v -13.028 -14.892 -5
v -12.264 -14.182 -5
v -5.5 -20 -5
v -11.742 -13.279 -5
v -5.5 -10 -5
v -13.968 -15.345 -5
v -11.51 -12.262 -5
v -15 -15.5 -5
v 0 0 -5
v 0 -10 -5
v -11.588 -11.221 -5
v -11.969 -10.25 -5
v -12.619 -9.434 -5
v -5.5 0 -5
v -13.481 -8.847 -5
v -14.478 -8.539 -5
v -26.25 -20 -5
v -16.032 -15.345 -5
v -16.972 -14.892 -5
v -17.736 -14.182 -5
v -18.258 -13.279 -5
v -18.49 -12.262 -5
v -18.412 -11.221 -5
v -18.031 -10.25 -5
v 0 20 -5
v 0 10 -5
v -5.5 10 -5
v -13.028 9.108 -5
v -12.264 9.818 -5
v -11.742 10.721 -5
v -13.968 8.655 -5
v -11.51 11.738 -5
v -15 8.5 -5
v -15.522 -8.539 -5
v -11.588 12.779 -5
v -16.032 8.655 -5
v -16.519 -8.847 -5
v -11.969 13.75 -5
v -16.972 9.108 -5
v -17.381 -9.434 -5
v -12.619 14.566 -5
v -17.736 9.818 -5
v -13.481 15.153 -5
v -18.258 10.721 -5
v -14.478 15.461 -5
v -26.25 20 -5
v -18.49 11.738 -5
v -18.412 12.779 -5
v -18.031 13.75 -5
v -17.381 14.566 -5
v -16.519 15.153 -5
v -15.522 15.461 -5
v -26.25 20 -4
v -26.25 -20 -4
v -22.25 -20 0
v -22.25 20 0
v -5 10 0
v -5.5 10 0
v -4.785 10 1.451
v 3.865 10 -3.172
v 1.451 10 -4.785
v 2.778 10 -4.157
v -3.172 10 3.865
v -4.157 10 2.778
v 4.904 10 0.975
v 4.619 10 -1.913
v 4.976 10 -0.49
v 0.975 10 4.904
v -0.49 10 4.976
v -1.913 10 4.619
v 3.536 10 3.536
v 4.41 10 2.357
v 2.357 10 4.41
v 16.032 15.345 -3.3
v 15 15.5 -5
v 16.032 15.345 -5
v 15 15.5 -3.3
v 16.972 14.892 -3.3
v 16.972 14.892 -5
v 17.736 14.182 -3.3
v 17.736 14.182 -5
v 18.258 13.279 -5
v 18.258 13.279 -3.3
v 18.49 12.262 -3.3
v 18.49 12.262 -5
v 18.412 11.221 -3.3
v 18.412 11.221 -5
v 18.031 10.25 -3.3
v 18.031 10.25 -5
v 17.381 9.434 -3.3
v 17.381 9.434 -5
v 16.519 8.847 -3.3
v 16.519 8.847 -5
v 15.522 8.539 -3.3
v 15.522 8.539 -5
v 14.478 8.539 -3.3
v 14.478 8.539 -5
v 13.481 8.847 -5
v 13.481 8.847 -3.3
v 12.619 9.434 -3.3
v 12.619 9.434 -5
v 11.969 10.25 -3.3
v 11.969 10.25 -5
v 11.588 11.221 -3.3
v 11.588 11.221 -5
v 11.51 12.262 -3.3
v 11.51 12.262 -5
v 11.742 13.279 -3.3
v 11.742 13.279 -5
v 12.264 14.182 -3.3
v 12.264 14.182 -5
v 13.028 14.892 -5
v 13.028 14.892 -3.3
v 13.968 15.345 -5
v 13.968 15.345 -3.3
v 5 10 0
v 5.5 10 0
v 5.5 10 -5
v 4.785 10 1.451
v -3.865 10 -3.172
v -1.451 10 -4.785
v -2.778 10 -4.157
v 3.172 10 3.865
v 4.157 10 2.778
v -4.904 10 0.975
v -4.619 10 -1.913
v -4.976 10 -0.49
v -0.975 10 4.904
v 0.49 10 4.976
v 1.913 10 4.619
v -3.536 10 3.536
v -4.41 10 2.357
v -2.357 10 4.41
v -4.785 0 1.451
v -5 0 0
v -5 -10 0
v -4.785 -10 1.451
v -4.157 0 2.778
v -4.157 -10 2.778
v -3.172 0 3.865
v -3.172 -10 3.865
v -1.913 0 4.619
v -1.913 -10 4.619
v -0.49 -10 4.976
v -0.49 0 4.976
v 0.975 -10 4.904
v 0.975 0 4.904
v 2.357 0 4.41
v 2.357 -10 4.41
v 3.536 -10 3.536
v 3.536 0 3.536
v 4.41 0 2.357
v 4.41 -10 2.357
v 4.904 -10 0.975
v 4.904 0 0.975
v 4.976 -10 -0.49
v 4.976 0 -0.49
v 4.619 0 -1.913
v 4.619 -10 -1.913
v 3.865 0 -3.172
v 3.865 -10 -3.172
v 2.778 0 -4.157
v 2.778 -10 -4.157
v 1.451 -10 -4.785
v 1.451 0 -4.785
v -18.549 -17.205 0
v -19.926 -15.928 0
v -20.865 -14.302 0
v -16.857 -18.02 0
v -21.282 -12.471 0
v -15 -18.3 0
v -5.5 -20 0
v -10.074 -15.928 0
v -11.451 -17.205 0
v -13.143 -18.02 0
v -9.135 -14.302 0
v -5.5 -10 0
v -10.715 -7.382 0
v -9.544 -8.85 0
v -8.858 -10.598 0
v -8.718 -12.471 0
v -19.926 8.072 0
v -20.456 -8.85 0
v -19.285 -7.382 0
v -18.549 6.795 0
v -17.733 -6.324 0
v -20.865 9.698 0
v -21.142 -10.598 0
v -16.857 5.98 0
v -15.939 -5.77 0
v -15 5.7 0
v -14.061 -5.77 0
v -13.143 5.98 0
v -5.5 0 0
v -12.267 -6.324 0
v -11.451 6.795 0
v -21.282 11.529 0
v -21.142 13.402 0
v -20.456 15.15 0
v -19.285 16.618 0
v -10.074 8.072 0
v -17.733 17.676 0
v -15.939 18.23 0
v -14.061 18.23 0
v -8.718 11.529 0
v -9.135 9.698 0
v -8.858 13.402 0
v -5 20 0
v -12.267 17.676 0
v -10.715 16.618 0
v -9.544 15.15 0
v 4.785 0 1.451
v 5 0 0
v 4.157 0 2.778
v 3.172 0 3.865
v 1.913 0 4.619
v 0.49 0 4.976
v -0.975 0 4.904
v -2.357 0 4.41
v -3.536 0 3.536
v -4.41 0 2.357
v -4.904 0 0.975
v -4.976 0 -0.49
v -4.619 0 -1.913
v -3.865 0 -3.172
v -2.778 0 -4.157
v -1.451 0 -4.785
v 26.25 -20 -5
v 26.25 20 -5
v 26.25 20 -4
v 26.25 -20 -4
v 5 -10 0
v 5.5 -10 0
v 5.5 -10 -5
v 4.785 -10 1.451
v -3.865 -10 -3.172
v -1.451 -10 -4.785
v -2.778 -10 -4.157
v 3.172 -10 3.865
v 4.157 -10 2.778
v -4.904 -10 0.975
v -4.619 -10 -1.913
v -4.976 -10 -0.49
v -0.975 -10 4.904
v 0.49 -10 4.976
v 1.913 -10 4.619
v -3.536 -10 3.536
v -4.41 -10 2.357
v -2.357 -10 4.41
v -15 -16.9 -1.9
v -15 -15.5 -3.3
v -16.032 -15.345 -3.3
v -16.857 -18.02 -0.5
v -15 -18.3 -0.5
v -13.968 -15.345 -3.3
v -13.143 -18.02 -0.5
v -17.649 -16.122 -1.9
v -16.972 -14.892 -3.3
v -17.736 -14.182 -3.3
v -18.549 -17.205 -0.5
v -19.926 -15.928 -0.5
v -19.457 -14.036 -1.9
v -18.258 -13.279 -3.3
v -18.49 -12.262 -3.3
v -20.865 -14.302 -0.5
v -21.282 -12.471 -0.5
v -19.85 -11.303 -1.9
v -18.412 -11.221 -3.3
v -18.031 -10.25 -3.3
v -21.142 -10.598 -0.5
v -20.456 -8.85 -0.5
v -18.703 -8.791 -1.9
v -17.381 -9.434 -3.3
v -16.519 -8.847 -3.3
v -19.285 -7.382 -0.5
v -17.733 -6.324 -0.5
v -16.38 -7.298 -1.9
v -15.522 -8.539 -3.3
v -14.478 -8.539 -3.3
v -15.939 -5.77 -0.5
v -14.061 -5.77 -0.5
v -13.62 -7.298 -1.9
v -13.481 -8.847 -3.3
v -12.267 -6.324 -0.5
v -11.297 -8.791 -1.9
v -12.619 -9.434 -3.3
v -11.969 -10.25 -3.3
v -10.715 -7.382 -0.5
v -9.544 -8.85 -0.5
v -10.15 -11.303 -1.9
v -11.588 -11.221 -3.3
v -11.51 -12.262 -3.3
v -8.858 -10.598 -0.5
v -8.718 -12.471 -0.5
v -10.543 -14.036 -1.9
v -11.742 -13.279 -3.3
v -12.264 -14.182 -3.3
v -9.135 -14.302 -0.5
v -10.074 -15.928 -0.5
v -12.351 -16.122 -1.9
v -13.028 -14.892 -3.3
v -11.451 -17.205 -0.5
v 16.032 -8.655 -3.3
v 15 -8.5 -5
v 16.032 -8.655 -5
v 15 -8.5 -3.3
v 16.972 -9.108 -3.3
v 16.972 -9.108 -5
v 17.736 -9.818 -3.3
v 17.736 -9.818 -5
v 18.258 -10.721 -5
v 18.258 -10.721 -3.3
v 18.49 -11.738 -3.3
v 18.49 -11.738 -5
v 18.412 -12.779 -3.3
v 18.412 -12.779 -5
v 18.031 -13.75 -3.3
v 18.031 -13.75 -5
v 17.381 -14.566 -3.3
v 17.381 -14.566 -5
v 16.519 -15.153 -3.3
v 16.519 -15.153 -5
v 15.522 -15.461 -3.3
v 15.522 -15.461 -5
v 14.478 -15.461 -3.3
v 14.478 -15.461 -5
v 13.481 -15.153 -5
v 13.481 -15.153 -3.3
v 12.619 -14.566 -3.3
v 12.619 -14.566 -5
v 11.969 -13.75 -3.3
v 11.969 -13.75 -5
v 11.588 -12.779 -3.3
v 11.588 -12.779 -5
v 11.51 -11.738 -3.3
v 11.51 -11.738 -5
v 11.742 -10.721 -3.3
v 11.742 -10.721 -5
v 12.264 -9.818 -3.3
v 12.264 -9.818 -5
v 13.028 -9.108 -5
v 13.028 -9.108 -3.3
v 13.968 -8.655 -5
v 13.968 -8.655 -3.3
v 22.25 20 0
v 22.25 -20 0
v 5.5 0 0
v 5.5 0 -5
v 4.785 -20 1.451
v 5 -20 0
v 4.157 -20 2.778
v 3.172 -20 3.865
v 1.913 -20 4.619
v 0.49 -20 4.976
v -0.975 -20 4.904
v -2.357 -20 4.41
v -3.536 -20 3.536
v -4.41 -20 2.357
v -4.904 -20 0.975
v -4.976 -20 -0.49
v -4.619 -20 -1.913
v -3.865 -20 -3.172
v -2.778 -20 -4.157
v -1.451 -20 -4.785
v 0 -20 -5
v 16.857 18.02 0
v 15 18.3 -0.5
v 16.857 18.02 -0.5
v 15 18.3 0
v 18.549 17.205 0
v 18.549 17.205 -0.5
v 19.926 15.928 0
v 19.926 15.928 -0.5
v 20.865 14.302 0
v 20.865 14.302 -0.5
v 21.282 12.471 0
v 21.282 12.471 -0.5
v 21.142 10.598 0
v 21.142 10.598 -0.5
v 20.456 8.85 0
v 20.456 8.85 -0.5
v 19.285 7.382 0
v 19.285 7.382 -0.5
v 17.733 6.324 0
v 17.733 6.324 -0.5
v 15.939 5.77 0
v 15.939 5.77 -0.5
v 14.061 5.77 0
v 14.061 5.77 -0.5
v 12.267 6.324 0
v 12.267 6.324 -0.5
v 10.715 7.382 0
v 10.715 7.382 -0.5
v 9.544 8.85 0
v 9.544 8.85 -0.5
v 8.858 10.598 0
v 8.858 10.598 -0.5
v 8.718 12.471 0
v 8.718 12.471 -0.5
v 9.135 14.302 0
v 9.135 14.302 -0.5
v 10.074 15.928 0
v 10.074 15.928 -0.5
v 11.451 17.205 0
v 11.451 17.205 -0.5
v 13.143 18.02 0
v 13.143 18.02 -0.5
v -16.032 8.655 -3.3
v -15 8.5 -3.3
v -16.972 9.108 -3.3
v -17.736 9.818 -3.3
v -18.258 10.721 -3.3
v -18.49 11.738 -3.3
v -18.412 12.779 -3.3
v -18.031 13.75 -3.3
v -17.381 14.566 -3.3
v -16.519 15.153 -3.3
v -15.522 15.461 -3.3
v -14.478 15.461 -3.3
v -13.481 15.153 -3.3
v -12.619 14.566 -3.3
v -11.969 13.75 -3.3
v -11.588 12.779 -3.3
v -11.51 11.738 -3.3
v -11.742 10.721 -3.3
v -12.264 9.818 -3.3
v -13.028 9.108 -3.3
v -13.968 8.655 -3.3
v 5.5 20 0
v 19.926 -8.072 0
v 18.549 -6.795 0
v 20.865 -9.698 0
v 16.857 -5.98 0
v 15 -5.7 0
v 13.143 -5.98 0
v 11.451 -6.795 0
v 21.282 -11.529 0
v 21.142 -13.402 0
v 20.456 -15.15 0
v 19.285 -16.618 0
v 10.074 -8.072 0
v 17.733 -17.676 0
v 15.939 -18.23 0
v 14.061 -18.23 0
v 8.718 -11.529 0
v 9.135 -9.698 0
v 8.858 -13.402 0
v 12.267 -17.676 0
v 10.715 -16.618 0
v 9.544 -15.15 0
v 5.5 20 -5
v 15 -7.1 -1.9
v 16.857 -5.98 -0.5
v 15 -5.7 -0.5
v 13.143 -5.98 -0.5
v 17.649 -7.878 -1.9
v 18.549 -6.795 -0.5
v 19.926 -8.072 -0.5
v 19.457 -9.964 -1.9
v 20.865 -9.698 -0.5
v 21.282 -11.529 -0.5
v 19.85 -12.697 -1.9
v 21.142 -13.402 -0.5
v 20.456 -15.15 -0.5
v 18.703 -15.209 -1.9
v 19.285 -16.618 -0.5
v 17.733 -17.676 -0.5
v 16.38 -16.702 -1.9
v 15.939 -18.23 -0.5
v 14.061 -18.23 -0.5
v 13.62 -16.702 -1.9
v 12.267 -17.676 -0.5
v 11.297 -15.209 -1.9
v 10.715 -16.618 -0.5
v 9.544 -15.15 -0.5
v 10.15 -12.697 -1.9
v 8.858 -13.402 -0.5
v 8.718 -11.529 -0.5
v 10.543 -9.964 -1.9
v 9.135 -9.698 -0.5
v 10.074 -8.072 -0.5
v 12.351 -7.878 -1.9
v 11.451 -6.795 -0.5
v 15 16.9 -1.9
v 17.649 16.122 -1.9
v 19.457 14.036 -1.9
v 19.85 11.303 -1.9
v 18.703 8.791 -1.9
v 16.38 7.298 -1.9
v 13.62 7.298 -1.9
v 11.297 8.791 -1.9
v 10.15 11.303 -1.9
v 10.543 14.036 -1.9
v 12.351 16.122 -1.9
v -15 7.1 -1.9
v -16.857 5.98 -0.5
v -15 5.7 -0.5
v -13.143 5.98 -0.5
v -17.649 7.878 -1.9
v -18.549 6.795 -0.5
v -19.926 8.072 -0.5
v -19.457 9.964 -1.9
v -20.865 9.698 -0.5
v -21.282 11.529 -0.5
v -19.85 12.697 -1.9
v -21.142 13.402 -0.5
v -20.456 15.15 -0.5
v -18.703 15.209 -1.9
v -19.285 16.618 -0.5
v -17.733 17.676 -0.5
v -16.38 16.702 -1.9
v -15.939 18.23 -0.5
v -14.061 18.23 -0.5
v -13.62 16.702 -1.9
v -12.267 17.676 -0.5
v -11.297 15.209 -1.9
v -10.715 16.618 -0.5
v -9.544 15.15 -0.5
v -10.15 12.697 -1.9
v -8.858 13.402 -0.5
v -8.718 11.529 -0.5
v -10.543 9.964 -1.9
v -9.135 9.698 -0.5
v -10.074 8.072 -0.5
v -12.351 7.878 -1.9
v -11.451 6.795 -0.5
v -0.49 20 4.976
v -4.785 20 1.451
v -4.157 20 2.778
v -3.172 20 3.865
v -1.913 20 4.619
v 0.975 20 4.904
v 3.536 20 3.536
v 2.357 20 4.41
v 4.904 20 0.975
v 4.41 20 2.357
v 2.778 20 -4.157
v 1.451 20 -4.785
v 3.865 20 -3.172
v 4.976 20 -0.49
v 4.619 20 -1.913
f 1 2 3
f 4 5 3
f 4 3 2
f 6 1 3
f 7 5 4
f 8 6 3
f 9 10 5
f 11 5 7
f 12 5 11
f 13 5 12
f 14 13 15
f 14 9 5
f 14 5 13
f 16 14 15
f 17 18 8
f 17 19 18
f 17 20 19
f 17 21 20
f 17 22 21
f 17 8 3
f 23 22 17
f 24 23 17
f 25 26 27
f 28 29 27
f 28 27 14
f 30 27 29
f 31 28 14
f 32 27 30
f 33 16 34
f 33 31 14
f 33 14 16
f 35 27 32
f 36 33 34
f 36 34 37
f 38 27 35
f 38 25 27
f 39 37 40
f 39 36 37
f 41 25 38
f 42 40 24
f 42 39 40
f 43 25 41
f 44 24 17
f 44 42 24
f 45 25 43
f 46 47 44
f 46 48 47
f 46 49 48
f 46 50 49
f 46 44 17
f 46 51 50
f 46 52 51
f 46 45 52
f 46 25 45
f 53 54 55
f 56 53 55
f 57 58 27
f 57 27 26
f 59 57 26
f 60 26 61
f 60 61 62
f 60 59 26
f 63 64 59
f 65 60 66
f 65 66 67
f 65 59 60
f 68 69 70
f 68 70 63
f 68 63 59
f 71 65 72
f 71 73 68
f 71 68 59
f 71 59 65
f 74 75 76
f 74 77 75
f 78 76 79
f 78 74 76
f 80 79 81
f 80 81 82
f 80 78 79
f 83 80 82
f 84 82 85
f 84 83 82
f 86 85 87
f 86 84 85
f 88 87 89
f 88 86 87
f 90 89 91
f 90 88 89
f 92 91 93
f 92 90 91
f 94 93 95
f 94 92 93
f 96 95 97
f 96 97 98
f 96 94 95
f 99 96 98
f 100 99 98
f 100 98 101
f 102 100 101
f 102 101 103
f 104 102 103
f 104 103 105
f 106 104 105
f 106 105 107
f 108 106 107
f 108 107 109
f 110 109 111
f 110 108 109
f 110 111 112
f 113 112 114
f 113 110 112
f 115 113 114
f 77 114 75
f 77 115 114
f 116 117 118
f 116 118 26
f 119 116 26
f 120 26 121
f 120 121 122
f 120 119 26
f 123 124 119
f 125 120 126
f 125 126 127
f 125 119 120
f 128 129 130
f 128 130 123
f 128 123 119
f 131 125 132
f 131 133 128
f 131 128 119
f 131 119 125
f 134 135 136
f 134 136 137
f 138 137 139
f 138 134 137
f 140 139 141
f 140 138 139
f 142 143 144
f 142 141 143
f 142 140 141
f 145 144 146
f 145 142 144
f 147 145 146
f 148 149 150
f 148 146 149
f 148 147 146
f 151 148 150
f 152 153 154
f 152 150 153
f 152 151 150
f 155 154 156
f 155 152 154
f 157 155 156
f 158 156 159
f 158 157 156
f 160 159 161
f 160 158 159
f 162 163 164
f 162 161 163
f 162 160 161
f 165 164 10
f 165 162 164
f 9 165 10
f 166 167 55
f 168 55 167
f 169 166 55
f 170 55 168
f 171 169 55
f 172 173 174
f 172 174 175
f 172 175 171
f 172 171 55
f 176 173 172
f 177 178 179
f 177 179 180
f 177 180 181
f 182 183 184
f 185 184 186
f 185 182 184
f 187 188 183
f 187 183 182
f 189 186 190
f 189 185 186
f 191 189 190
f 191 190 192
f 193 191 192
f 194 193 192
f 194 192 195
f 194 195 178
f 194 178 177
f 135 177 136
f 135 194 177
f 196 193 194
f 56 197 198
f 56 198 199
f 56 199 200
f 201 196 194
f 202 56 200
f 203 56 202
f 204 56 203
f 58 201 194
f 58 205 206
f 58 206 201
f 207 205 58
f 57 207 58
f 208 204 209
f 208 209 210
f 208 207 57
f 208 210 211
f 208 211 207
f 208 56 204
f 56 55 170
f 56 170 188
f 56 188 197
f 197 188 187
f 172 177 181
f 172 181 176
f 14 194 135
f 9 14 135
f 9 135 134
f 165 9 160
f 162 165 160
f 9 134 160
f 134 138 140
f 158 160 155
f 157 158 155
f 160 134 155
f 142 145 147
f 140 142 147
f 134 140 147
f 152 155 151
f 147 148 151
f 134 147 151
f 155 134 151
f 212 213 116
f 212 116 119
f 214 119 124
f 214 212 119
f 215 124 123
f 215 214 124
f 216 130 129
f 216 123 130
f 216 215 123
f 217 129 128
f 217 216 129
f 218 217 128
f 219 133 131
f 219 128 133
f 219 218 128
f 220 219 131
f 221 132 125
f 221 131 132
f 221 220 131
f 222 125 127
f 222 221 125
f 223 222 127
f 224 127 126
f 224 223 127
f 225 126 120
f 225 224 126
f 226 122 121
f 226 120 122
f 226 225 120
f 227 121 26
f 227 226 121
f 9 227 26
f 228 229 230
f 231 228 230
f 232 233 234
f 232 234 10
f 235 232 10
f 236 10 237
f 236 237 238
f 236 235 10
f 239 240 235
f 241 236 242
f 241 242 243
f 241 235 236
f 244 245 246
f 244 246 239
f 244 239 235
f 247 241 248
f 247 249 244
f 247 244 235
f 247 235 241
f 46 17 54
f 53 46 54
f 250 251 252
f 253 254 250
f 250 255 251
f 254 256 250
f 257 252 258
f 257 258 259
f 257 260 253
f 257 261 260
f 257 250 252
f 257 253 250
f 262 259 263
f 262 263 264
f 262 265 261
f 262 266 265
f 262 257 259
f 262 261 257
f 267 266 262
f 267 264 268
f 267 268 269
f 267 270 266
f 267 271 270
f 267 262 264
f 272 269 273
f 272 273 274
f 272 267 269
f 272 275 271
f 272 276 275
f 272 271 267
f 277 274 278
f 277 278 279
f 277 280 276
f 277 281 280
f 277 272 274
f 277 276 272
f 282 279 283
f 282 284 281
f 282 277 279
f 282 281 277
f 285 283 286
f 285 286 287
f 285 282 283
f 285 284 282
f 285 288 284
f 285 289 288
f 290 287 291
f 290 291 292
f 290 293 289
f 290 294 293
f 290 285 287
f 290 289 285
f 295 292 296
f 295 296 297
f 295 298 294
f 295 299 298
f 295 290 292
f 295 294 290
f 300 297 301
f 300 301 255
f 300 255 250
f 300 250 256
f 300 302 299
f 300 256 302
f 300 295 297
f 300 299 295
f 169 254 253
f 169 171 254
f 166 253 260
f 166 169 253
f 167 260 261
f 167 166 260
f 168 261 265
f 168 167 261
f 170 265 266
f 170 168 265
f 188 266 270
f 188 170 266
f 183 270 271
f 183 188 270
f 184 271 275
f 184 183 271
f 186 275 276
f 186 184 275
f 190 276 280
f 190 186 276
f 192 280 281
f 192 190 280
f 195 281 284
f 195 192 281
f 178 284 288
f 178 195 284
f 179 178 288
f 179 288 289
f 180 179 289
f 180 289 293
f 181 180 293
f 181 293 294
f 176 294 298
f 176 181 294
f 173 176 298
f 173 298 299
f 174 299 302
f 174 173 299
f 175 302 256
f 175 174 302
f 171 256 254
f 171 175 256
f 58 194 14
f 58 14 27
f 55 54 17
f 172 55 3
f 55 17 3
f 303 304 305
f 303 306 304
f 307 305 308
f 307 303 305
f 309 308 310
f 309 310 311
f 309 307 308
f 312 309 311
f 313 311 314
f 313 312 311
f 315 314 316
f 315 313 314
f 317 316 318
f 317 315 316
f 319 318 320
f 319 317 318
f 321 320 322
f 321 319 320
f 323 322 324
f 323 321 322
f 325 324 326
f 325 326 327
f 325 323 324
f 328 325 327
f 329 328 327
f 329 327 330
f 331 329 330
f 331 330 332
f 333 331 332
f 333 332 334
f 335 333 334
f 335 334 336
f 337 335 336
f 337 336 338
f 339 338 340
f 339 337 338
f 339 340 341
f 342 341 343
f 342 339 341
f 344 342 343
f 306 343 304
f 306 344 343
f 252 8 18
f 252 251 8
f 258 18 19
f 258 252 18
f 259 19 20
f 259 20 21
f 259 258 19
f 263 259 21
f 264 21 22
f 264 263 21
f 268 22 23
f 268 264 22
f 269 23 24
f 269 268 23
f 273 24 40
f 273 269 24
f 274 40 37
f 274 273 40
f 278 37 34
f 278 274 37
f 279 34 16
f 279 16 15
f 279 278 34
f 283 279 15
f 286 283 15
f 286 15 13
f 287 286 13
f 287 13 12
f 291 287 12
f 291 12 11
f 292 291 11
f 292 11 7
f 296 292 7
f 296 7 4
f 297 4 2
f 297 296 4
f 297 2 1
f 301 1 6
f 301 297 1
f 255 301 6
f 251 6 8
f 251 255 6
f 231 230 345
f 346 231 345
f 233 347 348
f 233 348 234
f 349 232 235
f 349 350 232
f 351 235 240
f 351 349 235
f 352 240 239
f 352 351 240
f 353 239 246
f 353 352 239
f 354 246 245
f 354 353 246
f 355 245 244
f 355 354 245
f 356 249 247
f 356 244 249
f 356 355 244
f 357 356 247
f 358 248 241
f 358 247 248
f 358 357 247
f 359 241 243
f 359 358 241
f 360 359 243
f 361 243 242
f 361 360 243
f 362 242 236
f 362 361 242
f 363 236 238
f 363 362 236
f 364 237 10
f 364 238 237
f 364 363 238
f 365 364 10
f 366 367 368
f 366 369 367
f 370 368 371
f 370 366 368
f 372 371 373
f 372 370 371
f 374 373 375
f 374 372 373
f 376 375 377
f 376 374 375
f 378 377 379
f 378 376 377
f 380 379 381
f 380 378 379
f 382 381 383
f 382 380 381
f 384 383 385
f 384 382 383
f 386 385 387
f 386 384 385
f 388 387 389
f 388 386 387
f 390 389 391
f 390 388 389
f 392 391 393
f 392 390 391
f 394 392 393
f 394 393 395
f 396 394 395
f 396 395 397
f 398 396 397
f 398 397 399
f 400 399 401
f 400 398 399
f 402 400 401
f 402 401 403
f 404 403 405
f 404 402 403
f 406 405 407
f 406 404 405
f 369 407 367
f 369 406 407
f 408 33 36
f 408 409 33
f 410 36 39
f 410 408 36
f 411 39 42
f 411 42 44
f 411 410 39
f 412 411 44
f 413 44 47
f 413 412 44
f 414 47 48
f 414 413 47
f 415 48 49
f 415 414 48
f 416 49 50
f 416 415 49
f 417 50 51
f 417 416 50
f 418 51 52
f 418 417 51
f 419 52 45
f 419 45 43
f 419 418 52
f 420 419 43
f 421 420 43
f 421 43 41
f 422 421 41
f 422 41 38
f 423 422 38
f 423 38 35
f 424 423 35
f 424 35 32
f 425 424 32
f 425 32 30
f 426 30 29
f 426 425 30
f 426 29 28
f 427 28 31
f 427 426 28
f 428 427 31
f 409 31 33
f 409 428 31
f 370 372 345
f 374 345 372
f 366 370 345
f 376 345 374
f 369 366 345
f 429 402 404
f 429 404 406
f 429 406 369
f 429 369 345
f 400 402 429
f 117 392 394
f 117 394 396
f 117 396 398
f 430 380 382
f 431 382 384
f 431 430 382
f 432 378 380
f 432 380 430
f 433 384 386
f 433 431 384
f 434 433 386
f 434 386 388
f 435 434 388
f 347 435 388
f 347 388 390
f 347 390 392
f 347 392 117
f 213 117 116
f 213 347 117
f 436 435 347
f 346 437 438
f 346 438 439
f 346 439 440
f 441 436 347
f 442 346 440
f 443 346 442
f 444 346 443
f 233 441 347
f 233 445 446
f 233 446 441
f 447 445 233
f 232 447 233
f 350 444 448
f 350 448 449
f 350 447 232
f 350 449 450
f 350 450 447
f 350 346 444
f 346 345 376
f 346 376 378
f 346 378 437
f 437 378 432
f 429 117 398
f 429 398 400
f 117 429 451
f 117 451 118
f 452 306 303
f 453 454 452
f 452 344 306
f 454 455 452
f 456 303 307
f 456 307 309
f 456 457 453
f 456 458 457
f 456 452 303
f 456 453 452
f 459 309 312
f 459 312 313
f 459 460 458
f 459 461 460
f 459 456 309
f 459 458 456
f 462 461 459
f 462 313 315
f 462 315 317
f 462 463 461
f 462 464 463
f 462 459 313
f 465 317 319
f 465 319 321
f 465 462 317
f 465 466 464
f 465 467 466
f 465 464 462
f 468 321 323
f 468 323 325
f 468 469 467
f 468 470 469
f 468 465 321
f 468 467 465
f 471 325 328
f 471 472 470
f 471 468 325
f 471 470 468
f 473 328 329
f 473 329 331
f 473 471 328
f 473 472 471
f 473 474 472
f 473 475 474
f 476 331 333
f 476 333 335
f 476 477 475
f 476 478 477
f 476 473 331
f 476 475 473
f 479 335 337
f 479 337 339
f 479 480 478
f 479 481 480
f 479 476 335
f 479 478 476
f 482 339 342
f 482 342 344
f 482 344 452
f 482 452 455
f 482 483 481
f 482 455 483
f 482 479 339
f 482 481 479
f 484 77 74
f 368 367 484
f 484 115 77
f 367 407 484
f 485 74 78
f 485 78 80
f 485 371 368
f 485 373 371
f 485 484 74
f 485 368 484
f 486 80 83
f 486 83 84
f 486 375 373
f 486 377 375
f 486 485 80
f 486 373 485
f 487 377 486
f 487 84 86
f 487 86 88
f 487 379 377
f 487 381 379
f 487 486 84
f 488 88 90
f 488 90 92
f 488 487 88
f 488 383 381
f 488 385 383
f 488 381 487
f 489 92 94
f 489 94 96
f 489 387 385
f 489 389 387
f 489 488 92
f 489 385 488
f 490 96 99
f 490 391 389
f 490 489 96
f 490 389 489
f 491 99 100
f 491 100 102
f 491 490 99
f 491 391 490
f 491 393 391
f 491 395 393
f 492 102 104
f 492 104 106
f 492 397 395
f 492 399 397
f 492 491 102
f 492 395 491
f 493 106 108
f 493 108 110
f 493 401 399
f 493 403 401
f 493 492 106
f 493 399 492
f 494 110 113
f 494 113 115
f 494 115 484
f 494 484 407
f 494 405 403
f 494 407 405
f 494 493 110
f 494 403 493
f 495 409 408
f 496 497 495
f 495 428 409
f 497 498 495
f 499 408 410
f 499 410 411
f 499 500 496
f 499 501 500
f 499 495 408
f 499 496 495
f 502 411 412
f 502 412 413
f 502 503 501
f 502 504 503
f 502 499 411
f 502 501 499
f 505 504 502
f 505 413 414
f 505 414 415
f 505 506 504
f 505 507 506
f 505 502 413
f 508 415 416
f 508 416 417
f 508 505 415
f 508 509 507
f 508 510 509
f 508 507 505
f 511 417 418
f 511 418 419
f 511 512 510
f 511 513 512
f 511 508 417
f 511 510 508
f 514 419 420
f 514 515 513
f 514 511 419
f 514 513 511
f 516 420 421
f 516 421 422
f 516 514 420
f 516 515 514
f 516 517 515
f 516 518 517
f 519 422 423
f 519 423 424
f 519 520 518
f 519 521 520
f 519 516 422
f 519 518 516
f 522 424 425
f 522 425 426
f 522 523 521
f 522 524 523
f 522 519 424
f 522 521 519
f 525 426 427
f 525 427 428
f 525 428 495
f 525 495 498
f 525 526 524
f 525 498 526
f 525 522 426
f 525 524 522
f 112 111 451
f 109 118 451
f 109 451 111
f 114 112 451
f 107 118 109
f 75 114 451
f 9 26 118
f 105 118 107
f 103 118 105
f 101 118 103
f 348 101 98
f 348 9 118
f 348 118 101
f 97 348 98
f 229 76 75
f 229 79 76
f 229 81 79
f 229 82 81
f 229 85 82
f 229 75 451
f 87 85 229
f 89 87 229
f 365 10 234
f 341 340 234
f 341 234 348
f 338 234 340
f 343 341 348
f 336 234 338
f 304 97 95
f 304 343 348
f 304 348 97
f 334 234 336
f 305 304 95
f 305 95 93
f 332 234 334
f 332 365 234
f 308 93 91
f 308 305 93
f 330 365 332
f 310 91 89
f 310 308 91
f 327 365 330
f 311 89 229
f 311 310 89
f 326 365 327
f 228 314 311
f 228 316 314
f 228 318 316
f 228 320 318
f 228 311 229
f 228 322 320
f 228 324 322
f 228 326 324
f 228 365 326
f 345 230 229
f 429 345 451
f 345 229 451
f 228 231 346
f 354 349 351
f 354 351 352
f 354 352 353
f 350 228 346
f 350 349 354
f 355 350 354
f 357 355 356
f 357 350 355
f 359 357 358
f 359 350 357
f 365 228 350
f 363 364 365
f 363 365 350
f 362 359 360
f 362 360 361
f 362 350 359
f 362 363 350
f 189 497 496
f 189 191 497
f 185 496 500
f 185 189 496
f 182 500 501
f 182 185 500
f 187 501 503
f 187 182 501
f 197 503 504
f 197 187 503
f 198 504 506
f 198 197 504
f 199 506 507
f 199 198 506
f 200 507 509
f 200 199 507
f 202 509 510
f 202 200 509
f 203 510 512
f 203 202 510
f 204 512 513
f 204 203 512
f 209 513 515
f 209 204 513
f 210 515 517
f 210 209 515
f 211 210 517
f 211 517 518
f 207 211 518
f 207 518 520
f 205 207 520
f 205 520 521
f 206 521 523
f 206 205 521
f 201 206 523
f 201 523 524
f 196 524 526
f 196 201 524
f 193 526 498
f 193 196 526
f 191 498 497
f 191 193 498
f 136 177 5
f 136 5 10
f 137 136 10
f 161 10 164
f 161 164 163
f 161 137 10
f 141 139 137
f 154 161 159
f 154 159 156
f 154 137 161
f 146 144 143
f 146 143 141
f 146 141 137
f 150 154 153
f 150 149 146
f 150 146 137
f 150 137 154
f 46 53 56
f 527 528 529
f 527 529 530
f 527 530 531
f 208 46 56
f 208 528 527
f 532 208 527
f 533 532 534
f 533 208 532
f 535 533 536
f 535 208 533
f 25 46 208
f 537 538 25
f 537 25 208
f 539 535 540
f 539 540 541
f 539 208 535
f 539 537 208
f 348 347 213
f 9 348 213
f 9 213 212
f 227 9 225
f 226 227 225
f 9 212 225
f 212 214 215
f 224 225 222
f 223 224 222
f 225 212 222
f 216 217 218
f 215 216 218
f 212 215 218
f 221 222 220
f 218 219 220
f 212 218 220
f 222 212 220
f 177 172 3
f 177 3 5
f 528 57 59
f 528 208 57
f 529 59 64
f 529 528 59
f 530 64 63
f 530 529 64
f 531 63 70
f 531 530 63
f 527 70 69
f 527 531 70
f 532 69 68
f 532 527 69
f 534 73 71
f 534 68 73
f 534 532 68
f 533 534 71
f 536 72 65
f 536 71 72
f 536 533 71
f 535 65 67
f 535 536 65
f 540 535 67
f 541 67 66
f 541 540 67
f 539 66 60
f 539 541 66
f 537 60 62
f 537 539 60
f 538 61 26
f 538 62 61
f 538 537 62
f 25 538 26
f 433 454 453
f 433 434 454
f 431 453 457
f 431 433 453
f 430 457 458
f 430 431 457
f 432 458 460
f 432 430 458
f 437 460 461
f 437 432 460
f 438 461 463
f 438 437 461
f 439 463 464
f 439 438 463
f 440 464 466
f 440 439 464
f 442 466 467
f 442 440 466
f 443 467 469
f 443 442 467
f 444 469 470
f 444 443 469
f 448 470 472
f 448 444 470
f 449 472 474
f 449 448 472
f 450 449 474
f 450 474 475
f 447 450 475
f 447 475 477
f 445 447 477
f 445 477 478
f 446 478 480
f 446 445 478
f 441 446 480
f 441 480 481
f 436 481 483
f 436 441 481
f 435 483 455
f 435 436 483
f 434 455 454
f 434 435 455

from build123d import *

# Parameters (mm, degrees)
EXTRUDE_1_DEPTH            = 20
SKETCH_3_W                 = 10.5
SKETCH_3_H                 = 10
CUT_EXTRUDE_1_DEPTH        = 6
CUT_EXTRUDE_1_DEPTH_BACK   = 6
HOLE_WIZARD_M61_AT_2_COUNT = 2
HOLE_WIZARD_M61_AT_2_PITCH = 24
PATTERN_CIRCULAR_1_COUNT   = 2


with BuildPart() as part:
    # Эскиз1 → Бобышка-Вытянуть1 (new body, symmetric)
    with BuildSketch(Plane(origin=(0, 0, 0), x_dir=(1, 0, 0), z_dir=(0, 1, 0))):
        with BuildLine():
            Line((0, 5), (-26.25, 5))
            Line((-26.25, 5), (-26.25, 4))
            Line((-26.25, 4), (-22.25, 0))
            Line((-22.25, 0), (-5, 0))
            ThreePointArc((-5, 0), (3.535533906, -3.535533906), (0, 5))
        make_face()
    extrude(amount=EXTRUDE_1_DEPTH, both=True)

    # Эскиз3 → Вырез-Вытянуть1 (cut, two sides)
    with BuildSketch(Plane.XY) as cut_extrude_1_sk:
        with Locations((-0.25, 5)):
            Rectangle(SKETCH_3_W, SKETCH_3_H)
        with Locations((-0.25, -15)):
            Rectangle(SKETCH_3_W, SKETCH_3_H)
    extrude(amount=CUT_EXTRUDE_1_DEPTH, mode=Mode.SUBTRACT)
    extrude(cut_extrude_1_sk.sketch, amount=-CUT_EXTRUDE_1_DEPTH_BACK, mode=Mode.SUBTRACT)

    # Эскиз6 → Зенковка для винта с полупотайной головкой M61 (revolve, cut)
    with BuildSketch(Plane(origin=(-15, 12, 0), x_dir=(0, -1, 0), z_dir=(1, 0, 0))):
        Polygon((0, 0), (0, 5), (3.5, 5), (3.5, 3.3), (6.3, 0.5), (6.3, 0), align=None)
    hole_wizard_m61 = revolve(axis=Axis((-15, 12, 6.35), (0, 0, -1)), mode=Mode.SUBTRACT)

    # Зенковка для винта с полупотайной головкой M61 at 2: Зенковка для винта с полупотайной головкой M61 ×2
    with Locations(*[(0, -i * HOLE_WIZARD_M61_AT_2_PITCH, 0) for i in range(1, HOLE_WIZARD_M61_AT_2_COUNT)]):
        add(hole_wizard_m61, mode=Mode.SUBTRACT)


with BuildPart() as pattern_circular_1_1:
    # Круговой массив1: pattern copy
    add(part.part.rotate(Axis((0, 0, 0), (0, 0, 1)), 1 * 360 / PATTERN_CIRCULAR_1_COUNT))


solid = Compound([part.part, pattern_circular_1_1.part])
